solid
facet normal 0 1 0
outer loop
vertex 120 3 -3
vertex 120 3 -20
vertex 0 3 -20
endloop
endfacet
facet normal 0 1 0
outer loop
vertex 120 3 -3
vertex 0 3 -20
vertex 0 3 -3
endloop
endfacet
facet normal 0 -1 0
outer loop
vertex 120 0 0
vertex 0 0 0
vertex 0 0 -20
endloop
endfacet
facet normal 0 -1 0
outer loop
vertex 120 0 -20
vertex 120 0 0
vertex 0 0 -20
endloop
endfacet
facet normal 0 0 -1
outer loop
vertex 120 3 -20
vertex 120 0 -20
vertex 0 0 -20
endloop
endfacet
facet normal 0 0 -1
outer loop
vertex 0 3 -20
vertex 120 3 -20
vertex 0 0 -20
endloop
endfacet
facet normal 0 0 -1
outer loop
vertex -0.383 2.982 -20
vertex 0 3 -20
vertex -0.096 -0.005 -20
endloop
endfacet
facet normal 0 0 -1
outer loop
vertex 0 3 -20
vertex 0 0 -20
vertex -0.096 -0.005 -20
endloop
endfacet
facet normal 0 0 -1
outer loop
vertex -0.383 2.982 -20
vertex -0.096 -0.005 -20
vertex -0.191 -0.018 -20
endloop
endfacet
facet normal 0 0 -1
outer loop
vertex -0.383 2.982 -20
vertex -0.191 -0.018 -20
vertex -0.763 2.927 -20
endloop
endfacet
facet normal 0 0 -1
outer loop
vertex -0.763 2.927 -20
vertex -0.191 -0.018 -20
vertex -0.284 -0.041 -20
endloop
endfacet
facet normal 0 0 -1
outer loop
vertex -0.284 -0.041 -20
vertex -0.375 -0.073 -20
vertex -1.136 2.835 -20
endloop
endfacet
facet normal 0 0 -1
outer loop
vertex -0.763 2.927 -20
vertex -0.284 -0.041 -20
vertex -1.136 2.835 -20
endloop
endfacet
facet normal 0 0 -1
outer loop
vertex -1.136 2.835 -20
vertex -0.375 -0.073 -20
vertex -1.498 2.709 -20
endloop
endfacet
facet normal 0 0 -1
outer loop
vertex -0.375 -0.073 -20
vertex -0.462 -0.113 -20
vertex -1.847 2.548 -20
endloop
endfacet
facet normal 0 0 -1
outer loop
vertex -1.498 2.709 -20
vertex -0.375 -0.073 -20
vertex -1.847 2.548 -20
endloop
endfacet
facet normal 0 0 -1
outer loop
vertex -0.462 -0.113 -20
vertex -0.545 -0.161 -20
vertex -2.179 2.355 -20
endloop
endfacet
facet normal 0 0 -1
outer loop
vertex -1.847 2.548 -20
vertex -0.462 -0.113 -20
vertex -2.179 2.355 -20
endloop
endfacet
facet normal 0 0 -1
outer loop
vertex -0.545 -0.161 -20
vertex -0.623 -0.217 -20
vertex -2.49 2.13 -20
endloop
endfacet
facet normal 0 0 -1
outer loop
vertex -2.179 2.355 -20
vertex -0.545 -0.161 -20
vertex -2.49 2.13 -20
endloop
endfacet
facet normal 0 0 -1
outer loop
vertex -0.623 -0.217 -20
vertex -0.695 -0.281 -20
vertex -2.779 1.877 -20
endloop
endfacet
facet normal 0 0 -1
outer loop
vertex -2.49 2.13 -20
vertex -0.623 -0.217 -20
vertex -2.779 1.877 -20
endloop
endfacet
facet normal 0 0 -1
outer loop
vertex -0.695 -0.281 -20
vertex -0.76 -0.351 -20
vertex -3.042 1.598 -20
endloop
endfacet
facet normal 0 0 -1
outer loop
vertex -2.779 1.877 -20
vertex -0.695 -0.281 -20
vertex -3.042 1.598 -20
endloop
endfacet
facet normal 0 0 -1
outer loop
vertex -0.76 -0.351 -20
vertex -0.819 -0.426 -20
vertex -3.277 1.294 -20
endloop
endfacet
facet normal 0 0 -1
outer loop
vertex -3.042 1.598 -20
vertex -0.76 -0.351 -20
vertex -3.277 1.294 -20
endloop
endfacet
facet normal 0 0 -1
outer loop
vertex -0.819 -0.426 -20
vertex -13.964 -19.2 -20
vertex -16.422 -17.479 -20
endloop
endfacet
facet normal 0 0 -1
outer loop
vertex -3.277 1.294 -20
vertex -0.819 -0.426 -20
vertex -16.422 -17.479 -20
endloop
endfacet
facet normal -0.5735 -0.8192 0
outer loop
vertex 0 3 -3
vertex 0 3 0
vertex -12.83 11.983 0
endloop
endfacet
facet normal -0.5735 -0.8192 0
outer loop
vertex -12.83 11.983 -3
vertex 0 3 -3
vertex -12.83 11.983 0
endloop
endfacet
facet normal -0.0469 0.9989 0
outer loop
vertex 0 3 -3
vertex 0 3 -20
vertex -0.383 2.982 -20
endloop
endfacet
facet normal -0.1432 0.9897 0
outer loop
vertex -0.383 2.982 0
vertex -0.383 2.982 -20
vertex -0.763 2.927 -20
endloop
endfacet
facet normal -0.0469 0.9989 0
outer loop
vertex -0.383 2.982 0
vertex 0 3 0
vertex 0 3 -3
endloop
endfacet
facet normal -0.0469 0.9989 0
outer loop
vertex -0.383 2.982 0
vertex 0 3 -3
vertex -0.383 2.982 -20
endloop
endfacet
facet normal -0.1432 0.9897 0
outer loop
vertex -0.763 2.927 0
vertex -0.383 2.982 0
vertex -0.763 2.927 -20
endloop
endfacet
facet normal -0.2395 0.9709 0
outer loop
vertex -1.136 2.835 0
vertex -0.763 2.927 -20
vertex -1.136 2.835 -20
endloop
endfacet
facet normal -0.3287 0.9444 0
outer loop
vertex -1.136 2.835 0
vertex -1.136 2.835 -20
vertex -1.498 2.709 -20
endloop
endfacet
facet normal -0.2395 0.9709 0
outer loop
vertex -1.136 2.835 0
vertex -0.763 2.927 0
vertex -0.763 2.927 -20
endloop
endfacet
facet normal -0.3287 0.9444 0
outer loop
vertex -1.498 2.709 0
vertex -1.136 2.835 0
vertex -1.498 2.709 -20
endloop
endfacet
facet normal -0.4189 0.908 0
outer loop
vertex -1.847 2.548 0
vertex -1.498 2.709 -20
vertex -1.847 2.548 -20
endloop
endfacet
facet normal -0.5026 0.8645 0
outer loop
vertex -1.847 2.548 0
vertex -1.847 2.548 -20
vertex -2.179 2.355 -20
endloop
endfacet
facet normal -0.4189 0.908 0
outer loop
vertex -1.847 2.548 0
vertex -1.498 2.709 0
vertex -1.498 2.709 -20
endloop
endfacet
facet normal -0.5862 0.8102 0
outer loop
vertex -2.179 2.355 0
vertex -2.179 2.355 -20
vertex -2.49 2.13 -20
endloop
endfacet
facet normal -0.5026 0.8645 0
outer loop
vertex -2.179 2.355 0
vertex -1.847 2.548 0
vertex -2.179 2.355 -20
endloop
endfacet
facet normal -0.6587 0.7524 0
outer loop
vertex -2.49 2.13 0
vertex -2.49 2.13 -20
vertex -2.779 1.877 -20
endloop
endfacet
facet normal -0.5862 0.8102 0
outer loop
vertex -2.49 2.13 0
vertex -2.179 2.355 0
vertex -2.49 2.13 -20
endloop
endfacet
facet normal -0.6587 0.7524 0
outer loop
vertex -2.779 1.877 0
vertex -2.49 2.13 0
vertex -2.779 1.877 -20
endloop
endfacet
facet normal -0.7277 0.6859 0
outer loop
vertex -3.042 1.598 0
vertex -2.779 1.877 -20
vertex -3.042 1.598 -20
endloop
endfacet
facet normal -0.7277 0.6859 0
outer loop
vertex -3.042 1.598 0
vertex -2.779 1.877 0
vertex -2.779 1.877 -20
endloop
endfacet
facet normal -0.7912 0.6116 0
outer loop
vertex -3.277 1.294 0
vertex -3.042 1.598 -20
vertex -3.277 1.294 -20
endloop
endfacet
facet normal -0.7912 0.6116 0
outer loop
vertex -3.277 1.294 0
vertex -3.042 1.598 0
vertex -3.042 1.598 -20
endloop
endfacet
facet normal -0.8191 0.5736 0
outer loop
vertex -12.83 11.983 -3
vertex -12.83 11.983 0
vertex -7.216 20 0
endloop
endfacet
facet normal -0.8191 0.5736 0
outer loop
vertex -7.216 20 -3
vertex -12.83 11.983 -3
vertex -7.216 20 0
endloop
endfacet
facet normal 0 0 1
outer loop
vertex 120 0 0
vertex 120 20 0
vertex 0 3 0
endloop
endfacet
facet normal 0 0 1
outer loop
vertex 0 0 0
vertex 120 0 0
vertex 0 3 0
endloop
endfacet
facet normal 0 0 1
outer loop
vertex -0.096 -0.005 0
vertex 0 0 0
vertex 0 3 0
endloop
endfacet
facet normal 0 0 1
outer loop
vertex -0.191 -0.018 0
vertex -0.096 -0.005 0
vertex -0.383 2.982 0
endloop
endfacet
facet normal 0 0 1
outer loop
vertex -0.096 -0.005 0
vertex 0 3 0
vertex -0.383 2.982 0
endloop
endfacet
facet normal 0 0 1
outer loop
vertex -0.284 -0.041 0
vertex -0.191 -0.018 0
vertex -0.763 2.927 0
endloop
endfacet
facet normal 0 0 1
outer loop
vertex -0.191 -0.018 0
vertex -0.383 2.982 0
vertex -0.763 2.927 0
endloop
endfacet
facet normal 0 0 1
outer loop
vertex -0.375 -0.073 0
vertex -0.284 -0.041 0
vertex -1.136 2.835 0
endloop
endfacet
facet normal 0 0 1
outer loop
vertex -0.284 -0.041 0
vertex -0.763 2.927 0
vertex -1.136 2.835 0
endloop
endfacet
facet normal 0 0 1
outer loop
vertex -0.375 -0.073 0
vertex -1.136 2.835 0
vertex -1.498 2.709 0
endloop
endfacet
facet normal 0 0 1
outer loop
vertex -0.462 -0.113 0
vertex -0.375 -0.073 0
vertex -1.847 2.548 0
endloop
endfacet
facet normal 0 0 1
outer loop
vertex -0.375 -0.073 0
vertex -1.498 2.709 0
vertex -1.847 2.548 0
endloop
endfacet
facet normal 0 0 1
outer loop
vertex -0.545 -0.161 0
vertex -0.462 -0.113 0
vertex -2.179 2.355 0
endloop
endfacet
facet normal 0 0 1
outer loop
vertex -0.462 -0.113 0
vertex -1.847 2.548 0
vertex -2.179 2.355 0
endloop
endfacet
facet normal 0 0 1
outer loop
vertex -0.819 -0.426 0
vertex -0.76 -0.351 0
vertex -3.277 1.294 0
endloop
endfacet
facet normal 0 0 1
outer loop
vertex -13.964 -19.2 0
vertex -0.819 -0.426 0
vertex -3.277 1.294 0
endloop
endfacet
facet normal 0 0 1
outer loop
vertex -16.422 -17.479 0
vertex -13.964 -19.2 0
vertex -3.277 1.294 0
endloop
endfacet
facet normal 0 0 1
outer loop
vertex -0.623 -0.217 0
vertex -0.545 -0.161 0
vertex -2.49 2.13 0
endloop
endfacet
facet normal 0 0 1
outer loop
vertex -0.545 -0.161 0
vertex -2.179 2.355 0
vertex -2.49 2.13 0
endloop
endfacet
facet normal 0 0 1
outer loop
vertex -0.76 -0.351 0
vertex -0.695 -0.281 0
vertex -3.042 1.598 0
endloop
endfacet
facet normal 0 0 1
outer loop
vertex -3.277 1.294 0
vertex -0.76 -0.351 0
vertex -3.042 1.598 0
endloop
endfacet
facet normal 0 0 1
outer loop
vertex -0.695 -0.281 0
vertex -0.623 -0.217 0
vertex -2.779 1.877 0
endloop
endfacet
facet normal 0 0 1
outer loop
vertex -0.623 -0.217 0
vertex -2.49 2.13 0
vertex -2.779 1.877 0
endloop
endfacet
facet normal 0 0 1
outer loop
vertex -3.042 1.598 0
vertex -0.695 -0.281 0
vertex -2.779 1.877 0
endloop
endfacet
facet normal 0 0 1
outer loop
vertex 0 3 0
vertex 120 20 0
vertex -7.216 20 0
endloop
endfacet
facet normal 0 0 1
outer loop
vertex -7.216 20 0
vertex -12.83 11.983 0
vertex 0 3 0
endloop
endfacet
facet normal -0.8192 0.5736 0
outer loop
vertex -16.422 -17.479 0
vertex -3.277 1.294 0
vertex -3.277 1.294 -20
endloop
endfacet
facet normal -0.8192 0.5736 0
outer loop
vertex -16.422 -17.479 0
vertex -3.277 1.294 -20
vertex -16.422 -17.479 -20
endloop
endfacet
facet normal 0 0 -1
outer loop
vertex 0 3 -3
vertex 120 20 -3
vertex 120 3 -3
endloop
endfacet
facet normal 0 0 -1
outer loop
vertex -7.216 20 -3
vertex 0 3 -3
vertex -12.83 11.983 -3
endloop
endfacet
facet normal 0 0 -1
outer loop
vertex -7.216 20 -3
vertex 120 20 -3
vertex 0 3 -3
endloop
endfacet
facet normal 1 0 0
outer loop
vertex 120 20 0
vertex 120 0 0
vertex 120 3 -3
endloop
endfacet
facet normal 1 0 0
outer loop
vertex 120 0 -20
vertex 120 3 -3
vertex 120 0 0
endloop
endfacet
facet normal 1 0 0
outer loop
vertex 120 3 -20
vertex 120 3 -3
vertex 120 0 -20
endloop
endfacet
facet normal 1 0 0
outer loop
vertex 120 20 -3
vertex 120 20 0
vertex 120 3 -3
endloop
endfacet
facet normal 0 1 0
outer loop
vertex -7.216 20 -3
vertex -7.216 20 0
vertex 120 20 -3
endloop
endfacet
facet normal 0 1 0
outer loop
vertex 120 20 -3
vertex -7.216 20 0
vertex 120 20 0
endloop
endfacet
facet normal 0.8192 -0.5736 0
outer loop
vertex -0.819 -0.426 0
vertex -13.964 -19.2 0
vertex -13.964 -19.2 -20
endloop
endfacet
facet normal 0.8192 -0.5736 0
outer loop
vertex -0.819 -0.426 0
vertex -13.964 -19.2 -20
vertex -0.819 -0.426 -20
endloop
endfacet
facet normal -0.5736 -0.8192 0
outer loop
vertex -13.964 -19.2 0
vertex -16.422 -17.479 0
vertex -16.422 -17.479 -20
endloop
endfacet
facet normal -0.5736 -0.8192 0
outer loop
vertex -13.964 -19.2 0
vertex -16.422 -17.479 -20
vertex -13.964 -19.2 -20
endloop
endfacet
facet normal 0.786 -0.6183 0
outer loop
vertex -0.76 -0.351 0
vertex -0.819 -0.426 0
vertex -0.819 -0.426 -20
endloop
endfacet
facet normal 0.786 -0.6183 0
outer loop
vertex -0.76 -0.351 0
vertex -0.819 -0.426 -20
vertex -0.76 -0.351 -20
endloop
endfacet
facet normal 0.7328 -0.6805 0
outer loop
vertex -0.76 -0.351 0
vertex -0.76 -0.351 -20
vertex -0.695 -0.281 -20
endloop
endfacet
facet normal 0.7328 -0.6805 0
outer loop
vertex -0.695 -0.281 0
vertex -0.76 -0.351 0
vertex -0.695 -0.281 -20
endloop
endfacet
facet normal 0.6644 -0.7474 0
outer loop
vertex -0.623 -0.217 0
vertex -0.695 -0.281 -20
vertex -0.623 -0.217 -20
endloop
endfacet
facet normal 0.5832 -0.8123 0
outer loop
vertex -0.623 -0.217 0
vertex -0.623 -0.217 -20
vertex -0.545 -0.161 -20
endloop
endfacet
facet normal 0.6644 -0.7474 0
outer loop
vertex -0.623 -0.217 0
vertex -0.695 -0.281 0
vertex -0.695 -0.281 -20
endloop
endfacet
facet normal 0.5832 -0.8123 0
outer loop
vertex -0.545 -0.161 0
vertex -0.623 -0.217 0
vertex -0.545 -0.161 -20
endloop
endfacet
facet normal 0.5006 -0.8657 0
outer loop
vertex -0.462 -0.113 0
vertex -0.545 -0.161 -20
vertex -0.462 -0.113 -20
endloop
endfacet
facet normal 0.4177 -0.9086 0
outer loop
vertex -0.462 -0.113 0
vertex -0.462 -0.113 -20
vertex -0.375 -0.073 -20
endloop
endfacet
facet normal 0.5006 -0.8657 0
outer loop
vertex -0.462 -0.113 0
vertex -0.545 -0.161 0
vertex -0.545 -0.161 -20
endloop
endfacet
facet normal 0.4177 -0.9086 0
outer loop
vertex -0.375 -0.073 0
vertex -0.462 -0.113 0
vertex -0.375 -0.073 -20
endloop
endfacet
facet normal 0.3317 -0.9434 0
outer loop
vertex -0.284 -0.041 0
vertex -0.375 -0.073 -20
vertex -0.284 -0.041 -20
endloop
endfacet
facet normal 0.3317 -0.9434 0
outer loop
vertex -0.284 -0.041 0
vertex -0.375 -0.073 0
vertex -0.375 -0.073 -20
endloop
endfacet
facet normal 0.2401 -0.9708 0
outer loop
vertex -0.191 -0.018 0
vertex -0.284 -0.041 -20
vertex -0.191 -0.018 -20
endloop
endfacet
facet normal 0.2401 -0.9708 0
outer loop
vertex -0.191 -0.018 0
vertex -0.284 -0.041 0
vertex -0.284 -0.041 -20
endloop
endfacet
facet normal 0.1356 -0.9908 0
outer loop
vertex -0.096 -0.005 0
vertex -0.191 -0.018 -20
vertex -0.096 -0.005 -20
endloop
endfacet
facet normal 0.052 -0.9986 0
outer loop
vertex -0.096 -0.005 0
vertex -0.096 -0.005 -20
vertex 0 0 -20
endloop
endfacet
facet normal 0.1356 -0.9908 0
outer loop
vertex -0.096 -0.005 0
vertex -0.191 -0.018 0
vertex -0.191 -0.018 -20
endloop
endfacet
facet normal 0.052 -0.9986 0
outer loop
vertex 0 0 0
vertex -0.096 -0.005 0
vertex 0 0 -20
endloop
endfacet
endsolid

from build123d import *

# Parameters (mm, degrees)
EXTRUDE_1_DEPTH        = 120
SKETCH_3_W             = 120
SKETCH_3_H             = 20
SM_BASE_FLANGE_1_DEPTH = 3
SM_EDGE_FLANGE_1_DEPTH = 20
EXTRUDE_1_2_DEPTH      = 3


# Sheet-metal steps are written as plain solids
with BuildPart() as part:
    # Sketch 1 → Extrude 1 (new body)
    with BuildSketch(Plane(origin=(0, 0, 0), x_dir=(0, 0, -1), z_dir=(1, 0, 0))):
        Polygon((0, 20), (0, 0), (20, 0), (20, 3), (3, 3), (3, 20), align=None)
    extrude(amount=EXTRUDE_1_DEPTH)



with BuildPart() as body_2:
    # Эскиз3 → Базовая кромка1 (new body)
    with BuildSketch(Plane.XZ):
        with Locations((60, -10)):
            Rectangle(SKETCH_3_W, SKETCH_3_H)
    extrude(amount=-SM_BASE_FLANGE_1_DEPTH)

    # Ребро-кромка1 section (across the edge) → Ребро-кромка1 (add)
    with BuildSketch(Plane(origin=(-0.520567051, 0, 0), x_dir=(0.8191520442889892, -0.5735764363510499, 0), z_dir=(0, 0, -1))):
        with BuildLine():
            Line((-3, 0.520567051), (-3, 23.438298848))
            Line((-3, 23.438298848), (0, 23.438298848))
            Line((0, 23.438298848), (0, 0.520567051))
            ThreePointArc((0, 0.520567051), (0.112989167, 0.058818437), (0.426423564, -0.298584994))
            Line((0.426423564, -0.298584994), (-1.294305745, -2.756041127))
            ThreePointArc((-1.294305745, -2.756041127), (-2.548043333, -1.326427402), (-3, 0.520567051))
        make_face()
    extrude(amount=SM_EDGE_FLANGE_1_DEPTH)


with BuildPart() as part_1:
    add(part.part)

    add(body_2.part)  # Extrude 1 2 merges body 2
    # Эскиз11 → Extrude 1 2 (add)
    with BuildSketch(Plane.XY):
        Polygon((0, 20), (0, 3), (-12.829726495, 11.983471205), (-7.216492602, 20), align=None)
    extrude(amount=-EXTRUDE_1_2_DEPTH)


solid = part_1.part
